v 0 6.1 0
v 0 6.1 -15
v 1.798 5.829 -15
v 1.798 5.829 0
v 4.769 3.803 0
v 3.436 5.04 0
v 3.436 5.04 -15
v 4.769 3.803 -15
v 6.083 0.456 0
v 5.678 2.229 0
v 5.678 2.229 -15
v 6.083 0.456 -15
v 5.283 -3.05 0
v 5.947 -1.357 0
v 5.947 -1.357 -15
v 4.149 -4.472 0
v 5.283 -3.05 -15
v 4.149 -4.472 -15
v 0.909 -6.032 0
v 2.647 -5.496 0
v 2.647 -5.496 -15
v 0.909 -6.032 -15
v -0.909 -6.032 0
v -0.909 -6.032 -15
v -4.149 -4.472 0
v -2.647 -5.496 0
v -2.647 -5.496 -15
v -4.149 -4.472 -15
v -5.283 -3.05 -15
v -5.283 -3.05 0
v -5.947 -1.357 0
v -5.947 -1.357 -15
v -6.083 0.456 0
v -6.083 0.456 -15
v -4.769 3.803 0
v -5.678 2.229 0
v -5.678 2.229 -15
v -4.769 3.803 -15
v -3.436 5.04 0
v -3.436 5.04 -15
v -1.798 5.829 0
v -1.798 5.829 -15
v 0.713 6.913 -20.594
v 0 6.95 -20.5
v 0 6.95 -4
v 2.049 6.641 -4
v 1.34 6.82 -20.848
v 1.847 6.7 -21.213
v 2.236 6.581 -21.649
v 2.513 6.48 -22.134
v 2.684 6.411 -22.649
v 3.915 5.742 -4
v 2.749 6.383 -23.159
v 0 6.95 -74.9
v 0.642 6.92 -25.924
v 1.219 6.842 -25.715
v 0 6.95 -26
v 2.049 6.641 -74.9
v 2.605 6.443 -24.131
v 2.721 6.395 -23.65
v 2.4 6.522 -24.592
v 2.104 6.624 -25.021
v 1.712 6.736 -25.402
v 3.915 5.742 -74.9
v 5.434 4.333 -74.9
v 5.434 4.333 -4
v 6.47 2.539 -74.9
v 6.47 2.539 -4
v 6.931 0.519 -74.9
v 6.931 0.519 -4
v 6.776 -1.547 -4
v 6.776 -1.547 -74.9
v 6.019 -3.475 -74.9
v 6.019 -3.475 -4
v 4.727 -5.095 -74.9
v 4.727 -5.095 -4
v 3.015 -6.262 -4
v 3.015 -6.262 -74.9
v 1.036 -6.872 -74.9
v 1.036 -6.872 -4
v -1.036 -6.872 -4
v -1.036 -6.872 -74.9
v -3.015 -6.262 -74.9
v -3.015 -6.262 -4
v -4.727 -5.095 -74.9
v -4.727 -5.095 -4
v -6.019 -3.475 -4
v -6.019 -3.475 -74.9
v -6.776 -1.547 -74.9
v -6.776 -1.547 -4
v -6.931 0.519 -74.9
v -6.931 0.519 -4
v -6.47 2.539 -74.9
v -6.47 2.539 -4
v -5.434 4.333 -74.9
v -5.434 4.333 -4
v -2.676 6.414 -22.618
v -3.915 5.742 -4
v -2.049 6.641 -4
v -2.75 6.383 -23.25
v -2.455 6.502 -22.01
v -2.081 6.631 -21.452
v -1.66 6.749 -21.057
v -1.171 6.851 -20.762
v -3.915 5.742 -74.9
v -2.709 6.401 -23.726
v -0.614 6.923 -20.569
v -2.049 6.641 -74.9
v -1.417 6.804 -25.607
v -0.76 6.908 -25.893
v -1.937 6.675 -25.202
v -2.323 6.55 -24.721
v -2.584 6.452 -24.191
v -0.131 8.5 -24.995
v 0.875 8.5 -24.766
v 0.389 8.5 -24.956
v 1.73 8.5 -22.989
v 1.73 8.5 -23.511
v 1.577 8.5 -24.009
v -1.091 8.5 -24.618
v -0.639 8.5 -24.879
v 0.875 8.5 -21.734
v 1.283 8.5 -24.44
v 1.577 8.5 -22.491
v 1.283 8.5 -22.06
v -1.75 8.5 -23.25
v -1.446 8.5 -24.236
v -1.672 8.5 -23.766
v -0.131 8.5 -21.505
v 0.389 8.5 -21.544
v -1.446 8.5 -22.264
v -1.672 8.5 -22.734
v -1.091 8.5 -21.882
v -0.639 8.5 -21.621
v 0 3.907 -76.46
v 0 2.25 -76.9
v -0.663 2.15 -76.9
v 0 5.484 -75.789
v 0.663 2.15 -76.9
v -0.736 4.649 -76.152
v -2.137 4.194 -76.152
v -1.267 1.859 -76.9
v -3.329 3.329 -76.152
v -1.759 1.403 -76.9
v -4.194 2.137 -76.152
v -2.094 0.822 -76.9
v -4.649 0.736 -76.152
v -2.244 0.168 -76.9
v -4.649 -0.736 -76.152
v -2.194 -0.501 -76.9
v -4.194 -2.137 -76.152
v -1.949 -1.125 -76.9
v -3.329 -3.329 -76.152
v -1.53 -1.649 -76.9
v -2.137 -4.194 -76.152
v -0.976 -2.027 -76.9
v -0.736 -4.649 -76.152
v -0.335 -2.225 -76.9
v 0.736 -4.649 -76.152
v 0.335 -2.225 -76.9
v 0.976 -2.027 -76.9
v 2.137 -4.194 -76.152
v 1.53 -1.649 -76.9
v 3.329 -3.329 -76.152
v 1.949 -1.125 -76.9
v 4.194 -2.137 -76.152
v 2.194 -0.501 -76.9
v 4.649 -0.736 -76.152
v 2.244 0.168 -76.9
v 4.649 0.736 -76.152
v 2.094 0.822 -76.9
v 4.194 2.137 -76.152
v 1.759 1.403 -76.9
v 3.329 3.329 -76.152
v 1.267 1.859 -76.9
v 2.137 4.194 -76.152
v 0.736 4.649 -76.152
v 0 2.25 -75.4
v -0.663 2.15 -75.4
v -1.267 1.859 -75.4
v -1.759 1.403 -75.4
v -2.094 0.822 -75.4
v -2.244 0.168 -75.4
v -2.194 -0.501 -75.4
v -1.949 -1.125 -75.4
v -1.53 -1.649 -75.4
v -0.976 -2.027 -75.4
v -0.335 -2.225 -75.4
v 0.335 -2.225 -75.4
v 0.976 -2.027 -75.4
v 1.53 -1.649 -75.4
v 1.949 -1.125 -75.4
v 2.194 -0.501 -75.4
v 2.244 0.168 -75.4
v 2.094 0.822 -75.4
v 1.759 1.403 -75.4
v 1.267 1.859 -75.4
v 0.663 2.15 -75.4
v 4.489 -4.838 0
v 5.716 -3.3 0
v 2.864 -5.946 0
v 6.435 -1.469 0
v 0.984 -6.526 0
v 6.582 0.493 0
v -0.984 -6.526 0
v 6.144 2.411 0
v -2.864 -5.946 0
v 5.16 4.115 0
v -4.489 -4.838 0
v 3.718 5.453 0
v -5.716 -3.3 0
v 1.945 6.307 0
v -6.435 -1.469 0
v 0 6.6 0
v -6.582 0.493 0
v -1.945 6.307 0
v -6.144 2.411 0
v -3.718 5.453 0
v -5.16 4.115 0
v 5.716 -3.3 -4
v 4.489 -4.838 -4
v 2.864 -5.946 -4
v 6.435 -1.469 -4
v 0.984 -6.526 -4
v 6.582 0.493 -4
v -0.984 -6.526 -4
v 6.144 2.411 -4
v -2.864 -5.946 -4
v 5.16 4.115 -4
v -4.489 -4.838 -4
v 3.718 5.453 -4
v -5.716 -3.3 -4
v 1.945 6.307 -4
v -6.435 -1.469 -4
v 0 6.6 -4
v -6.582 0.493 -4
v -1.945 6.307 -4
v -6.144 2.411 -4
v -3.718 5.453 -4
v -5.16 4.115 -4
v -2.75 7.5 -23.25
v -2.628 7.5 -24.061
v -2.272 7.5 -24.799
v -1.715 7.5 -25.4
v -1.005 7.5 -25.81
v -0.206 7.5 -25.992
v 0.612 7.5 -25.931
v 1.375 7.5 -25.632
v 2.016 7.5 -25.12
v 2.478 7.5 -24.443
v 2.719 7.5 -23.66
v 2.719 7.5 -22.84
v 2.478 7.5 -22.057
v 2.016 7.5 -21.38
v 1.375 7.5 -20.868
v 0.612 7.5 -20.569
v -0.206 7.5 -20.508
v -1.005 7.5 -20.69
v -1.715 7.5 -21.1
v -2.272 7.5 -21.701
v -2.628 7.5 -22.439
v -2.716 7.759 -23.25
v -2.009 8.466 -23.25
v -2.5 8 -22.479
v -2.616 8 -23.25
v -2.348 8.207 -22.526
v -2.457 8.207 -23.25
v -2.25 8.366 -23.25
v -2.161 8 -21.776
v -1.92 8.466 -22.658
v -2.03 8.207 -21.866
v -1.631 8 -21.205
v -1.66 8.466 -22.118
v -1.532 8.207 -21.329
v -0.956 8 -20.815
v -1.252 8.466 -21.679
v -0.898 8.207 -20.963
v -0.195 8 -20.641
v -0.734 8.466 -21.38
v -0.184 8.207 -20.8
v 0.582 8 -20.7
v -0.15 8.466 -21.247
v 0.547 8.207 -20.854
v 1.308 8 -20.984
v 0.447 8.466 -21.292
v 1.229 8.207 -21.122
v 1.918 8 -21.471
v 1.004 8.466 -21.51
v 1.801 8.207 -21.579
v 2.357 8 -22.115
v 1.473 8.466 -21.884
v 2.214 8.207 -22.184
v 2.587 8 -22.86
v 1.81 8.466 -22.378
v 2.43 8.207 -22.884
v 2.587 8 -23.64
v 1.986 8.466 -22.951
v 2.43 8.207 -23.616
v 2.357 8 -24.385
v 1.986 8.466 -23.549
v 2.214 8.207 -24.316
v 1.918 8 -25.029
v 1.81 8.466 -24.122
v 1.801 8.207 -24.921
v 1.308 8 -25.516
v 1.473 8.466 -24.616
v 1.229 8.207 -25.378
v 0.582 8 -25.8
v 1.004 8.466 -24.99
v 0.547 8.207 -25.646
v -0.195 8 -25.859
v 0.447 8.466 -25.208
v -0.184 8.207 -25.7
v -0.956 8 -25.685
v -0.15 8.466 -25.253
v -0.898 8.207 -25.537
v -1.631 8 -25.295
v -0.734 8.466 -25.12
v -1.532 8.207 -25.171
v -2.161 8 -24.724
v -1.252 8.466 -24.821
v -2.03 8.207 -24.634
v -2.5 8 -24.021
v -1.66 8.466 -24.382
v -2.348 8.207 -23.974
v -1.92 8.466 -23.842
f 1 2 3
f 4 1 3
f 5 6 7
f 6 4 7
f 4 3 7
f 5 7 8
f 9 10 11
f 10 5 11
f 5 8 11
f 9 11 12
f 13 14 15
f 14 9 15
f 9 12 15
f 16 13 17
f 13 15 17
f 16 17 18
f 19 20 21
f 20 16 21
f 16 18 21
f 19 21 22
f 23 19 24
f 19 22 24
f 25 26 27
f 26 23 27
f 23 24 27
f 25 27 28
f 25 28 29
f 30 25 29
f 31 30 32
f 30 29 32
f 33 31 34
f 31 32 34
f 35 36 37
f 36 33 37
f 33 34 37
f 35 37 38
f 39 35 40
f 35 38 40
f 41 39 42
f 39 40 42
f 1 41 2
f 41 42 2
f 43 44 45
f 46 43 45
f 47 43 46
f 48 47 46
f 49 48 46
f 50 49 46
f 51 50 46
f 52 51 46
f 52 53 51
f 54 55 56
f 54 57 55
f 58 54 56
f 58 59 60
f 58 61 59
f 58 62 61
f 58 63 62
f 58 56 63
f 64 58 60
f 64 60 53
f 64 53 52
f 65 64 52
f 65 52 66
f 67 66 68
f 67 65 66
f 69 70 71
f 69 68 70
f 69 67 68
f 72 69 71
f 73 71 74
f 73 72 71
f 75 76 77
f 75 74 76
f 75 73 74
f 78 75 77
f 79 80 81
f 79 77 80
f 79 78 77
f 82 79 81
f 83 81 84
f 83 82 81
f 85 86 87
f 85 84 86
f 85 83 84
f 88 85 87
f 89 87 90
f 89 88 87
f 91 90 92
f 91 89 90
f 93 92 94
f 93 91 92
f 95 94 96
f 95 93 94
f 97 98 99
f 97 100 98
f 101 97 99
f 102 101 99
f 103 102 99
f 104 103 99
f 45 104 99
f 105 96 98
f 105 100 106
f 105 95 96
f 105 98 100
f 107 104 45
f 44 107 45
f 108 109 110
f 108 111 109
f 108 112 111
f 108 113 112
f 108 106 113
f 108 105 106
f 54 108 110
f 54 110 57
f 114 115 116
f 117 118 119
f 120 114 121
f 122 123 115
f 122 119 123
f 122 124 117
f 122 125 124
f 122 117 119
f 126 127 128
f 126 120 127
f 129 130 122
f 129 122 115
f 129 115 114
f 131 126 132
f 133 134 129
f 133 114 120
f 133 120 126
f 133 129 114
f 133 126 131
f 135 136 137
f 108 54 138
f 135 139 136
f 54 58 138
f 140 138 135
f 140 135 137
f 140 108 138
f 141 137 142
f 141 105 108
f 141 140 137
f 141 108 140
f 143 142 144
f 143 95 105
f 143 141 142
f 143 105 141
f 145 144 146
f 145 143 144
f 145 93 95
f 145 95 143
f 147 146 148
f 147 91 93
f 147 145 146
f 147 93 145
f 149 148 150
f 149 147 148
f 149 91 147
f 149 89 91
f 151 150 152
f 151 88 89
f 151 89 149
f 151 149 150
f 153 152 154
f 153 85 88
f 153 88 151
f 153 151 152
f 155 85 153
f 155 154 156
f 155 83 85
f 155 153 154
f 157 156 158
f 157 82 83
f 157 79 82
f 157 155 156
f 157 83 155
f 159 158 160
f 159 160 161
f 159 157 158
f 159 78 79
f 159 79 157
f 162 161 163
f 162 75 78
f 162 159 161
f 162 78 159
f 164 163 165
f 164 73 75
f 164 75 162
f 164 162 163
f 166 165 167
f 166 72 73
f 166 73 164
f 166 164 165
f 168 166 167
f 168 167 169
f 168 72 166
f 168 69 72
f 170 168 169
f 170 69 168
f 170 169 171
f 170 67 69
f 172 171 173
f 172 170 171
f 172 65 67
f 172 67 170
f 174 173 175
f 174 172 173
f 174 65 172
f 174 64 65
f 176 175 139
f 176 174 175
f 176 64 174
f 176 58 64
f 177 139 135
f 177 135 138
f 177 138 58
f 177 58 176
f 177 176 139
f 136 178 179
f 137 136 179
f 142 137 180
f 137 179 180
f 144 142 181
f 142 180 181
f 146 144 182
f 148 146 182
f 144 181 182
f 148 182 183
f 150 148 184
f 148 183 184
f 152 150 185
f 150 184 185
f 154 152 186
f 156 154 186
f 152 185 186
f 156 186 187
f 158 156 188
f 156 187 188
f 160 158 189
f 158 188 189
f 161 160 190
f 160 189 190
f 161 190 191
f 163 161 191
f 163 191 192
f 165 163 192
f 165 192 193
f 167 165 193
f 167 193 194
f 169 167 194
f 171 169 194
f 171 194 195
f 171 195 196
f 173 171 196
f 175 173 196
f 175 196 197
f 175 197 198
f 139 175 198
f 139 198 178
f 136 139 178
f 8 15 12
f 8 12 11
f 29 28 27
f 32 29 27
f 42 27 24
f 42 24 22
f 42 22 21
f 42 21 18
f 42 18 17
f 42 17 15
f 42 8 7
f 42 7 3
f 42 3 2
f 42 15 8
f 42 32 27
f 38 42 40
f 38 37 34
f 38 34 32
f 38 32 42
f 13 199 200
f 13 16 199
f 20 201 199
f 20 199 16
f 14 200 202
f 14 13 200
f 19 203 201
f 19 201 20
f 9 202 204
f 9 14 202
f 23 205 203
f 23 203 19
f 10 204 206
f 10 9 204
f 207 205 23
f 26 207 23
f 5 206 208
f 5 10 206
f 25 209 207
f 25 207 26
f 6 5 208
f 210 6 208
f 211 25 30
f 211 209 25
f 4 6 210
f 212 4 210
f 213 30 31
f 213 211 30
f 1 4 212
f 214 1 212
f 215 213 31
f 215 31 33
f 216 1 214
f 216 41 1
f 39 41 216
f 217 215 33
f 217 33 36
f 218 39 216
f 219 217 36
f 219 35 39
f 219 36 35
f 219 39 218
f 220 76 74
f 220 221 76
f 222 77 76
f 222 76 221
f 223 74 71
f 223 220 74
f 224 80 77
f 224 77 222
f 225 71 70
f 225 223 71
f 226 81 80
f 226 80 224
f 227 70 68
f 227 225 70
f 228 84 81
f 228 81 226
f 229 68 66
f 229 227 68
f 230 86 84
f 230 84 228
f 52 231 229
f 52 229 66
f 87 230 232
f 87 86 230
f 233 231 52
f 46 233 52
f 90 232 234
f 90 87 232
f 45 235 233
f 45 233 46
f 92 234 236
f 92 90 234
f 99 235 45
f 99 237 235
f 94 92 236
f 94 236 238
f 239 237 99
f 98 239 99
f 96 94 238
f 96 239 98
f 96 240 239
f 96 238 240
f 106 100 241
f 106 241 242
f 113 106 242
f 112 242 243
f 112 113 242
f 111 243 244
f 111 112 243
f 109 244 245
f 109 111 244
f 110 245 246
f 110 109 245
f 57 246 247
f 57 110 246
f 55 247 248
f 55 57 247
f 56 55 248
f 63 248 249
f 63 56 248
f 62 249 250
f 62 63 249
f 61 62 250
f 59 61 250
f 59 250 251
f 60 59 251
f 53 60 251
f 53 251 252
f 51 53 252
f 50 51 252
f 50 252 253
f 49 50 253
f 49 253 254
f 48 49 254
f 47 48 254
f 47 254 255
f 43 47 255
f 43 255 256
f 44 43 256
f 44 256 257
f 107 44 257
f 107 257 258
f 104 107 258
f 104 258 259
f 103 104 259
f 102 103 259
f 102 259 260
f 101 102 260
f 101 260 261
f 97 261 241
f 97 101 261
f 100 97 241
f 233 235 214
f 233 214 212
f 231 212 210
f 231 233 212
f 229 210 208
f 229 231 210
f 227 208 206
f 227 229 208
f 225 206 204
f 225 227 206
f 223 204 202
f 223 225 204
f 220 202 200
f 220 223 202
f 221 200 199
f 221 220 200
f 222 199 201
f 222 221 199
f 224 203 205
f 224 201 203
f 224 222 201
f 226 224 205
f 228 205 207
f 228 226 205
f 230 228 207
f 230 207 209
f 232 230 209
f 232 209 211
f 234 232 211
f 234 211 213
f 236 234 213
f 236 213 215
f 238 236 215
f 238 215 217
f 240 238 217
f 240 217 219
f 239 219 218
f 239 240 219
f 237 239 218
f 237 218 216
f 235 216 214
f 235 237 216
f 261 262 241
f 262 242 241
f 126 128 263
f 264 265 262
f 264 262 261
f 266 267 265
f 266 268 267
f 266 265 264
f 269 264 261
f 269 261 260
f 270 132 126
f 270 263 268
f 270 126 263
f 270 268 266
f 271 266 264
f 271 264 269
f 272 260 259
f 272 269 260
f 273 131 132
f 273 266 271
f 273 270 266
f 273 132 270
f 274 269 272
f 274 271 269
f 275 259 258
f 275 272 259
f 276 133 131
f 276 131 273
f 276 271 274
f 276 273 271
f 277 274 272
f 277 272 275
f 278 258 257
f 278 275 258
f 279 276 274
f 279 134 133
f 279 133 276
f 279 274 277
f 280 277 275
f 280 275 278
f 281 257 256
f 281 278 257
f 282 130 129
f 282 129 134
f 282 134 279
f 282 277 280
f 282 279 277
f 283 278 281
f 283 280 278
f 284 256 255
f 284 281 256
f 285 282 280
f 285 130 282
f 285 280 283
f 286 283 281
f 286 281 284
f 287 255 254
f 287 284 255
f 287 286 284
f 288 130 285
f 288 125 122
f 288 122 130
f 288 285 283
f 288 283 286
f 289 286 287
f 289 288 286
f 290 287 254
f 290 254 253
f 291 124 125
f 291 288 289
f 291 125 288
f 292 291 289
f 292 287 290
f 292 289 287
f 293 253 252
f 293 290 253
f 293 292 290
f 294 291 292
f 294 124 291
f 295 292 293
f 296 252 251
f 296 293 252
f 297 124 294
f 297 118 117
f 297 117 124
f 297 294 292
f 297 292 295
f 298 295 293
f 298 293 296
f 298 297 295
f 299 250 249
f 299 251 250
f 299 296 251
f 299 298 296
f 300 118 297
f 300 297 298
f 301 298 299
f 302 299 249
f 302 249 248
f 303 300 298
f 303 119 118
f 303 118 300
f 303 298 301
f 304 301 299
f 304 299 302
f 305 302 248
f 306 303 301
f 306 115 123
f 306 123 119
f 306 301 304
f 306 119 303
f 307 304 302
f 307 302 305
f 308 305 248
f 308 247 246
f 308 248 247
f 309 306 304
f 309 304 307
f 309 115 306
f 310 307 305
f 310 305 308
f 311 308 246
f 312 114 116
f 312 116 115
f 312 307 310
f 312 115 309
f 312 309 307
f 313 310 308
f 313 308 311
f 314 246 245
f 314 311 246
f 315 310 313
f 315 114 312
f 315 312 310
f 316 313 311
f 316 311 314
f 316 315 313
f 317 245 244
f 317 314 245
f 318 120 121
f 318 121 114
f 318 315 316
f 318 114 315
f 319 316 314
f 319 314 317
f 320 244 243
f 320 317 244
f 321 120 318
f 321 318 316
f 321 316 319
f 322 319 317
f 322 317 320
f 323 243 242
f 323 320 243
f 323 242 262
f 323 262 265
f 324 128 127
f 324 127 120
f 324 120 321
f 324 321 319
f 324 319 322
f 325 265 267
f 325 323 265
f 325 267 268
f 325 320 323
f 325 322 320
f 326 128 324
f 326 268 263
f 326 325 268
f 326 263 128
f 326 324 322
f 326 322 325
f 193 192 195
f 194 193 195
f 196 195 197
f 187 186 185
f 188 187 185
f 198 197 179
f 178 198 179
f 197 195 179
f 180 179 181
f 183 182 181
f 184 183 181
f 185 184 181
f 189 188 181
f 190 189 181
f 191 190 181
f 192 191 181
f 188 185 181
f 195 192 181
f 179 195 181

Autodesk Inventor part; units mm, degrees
ref_plane "YZ Plane" through (0, 0, 0) normal (1, 0, 0) x (0, 1, 0)
ref_plane "XZ Plane" through (0, 0, 0) normal (0, 1, 0) x (-1, 0, 0)
ref_plane "XY Plane" through (0, 0, 0) normal (0, 0, 1) x (1, 0, 0)
sketch "Sketch1" plane through (0, 0, 0) normal (1, 0, 0) x (0, 1, 0)
  line L0 (0, 0) -> (6.1, 0) construction
  line L1 (6.6, 0) -> (6.6, -4)
  line L2 (6.6, -4) -> (6.95, -4)
  line L3 (6.95, -4) -> (6.95, -74.9)
  line L4 (6.95, -74.9) -> (0, -74.9) construction
  line L5 (0, -74.9) -> (0, -15)
  arc A0 (2.25, -76.9) -> (6.95, -74.9) centre (0, -65.09) ccw
  line L6 (2.25, -76.9) -> (2.25, -75.4)
  line L7 (2.25, -75.4) -> (0, -75.4)
  line L8 (0, -75.4) -> (0, -74.9)
  line L9 (6.1, 0) -> (6.1, -15)
  line L10 (6.1, -15) -> (0, -15)
  line L11 (6.1, 0) -> (6.6, 0)
  line L12 (0, -15) -> (0, 0) construction
  dimension "d0" = 6.95
  dimension "d1" = 6.6
  dimension "d2" = 4
  dimension "d4" = 76.9
  dimension "d5" = 2.25
  dimension "d6" = 1.5
  dimension "d7" = 2
  dimension "d9" = 0.5
  dimension "d10" = 15
revolve "Revolution1" add sketch "Sketch1" angle 360 about axis through (0, 0, -74.9) along (0, 0, 1)
sketch "Sketch2" plane through (0, 0, 0) normal (0, 1, 0) x (-1, 0, 0)
  line L0 (0, 0) -> (0, -26)
  line L1 (0, -26) -> (16.769, -26) construction
  circle A0 centre (0, -23.25) radius 2.75
  line L2 (-6.6, 0) -> (6.6, 0) projected
  dimension "d12" = 5.5
  dimension "d11" = 26
extrude "Extrusion1" add sketch "Sketch2" along normal blind 8.5
fillet "Fillet1" radius 1 1 edges at (2.75, 8.5, -23.25)
properties part number "LASER"
